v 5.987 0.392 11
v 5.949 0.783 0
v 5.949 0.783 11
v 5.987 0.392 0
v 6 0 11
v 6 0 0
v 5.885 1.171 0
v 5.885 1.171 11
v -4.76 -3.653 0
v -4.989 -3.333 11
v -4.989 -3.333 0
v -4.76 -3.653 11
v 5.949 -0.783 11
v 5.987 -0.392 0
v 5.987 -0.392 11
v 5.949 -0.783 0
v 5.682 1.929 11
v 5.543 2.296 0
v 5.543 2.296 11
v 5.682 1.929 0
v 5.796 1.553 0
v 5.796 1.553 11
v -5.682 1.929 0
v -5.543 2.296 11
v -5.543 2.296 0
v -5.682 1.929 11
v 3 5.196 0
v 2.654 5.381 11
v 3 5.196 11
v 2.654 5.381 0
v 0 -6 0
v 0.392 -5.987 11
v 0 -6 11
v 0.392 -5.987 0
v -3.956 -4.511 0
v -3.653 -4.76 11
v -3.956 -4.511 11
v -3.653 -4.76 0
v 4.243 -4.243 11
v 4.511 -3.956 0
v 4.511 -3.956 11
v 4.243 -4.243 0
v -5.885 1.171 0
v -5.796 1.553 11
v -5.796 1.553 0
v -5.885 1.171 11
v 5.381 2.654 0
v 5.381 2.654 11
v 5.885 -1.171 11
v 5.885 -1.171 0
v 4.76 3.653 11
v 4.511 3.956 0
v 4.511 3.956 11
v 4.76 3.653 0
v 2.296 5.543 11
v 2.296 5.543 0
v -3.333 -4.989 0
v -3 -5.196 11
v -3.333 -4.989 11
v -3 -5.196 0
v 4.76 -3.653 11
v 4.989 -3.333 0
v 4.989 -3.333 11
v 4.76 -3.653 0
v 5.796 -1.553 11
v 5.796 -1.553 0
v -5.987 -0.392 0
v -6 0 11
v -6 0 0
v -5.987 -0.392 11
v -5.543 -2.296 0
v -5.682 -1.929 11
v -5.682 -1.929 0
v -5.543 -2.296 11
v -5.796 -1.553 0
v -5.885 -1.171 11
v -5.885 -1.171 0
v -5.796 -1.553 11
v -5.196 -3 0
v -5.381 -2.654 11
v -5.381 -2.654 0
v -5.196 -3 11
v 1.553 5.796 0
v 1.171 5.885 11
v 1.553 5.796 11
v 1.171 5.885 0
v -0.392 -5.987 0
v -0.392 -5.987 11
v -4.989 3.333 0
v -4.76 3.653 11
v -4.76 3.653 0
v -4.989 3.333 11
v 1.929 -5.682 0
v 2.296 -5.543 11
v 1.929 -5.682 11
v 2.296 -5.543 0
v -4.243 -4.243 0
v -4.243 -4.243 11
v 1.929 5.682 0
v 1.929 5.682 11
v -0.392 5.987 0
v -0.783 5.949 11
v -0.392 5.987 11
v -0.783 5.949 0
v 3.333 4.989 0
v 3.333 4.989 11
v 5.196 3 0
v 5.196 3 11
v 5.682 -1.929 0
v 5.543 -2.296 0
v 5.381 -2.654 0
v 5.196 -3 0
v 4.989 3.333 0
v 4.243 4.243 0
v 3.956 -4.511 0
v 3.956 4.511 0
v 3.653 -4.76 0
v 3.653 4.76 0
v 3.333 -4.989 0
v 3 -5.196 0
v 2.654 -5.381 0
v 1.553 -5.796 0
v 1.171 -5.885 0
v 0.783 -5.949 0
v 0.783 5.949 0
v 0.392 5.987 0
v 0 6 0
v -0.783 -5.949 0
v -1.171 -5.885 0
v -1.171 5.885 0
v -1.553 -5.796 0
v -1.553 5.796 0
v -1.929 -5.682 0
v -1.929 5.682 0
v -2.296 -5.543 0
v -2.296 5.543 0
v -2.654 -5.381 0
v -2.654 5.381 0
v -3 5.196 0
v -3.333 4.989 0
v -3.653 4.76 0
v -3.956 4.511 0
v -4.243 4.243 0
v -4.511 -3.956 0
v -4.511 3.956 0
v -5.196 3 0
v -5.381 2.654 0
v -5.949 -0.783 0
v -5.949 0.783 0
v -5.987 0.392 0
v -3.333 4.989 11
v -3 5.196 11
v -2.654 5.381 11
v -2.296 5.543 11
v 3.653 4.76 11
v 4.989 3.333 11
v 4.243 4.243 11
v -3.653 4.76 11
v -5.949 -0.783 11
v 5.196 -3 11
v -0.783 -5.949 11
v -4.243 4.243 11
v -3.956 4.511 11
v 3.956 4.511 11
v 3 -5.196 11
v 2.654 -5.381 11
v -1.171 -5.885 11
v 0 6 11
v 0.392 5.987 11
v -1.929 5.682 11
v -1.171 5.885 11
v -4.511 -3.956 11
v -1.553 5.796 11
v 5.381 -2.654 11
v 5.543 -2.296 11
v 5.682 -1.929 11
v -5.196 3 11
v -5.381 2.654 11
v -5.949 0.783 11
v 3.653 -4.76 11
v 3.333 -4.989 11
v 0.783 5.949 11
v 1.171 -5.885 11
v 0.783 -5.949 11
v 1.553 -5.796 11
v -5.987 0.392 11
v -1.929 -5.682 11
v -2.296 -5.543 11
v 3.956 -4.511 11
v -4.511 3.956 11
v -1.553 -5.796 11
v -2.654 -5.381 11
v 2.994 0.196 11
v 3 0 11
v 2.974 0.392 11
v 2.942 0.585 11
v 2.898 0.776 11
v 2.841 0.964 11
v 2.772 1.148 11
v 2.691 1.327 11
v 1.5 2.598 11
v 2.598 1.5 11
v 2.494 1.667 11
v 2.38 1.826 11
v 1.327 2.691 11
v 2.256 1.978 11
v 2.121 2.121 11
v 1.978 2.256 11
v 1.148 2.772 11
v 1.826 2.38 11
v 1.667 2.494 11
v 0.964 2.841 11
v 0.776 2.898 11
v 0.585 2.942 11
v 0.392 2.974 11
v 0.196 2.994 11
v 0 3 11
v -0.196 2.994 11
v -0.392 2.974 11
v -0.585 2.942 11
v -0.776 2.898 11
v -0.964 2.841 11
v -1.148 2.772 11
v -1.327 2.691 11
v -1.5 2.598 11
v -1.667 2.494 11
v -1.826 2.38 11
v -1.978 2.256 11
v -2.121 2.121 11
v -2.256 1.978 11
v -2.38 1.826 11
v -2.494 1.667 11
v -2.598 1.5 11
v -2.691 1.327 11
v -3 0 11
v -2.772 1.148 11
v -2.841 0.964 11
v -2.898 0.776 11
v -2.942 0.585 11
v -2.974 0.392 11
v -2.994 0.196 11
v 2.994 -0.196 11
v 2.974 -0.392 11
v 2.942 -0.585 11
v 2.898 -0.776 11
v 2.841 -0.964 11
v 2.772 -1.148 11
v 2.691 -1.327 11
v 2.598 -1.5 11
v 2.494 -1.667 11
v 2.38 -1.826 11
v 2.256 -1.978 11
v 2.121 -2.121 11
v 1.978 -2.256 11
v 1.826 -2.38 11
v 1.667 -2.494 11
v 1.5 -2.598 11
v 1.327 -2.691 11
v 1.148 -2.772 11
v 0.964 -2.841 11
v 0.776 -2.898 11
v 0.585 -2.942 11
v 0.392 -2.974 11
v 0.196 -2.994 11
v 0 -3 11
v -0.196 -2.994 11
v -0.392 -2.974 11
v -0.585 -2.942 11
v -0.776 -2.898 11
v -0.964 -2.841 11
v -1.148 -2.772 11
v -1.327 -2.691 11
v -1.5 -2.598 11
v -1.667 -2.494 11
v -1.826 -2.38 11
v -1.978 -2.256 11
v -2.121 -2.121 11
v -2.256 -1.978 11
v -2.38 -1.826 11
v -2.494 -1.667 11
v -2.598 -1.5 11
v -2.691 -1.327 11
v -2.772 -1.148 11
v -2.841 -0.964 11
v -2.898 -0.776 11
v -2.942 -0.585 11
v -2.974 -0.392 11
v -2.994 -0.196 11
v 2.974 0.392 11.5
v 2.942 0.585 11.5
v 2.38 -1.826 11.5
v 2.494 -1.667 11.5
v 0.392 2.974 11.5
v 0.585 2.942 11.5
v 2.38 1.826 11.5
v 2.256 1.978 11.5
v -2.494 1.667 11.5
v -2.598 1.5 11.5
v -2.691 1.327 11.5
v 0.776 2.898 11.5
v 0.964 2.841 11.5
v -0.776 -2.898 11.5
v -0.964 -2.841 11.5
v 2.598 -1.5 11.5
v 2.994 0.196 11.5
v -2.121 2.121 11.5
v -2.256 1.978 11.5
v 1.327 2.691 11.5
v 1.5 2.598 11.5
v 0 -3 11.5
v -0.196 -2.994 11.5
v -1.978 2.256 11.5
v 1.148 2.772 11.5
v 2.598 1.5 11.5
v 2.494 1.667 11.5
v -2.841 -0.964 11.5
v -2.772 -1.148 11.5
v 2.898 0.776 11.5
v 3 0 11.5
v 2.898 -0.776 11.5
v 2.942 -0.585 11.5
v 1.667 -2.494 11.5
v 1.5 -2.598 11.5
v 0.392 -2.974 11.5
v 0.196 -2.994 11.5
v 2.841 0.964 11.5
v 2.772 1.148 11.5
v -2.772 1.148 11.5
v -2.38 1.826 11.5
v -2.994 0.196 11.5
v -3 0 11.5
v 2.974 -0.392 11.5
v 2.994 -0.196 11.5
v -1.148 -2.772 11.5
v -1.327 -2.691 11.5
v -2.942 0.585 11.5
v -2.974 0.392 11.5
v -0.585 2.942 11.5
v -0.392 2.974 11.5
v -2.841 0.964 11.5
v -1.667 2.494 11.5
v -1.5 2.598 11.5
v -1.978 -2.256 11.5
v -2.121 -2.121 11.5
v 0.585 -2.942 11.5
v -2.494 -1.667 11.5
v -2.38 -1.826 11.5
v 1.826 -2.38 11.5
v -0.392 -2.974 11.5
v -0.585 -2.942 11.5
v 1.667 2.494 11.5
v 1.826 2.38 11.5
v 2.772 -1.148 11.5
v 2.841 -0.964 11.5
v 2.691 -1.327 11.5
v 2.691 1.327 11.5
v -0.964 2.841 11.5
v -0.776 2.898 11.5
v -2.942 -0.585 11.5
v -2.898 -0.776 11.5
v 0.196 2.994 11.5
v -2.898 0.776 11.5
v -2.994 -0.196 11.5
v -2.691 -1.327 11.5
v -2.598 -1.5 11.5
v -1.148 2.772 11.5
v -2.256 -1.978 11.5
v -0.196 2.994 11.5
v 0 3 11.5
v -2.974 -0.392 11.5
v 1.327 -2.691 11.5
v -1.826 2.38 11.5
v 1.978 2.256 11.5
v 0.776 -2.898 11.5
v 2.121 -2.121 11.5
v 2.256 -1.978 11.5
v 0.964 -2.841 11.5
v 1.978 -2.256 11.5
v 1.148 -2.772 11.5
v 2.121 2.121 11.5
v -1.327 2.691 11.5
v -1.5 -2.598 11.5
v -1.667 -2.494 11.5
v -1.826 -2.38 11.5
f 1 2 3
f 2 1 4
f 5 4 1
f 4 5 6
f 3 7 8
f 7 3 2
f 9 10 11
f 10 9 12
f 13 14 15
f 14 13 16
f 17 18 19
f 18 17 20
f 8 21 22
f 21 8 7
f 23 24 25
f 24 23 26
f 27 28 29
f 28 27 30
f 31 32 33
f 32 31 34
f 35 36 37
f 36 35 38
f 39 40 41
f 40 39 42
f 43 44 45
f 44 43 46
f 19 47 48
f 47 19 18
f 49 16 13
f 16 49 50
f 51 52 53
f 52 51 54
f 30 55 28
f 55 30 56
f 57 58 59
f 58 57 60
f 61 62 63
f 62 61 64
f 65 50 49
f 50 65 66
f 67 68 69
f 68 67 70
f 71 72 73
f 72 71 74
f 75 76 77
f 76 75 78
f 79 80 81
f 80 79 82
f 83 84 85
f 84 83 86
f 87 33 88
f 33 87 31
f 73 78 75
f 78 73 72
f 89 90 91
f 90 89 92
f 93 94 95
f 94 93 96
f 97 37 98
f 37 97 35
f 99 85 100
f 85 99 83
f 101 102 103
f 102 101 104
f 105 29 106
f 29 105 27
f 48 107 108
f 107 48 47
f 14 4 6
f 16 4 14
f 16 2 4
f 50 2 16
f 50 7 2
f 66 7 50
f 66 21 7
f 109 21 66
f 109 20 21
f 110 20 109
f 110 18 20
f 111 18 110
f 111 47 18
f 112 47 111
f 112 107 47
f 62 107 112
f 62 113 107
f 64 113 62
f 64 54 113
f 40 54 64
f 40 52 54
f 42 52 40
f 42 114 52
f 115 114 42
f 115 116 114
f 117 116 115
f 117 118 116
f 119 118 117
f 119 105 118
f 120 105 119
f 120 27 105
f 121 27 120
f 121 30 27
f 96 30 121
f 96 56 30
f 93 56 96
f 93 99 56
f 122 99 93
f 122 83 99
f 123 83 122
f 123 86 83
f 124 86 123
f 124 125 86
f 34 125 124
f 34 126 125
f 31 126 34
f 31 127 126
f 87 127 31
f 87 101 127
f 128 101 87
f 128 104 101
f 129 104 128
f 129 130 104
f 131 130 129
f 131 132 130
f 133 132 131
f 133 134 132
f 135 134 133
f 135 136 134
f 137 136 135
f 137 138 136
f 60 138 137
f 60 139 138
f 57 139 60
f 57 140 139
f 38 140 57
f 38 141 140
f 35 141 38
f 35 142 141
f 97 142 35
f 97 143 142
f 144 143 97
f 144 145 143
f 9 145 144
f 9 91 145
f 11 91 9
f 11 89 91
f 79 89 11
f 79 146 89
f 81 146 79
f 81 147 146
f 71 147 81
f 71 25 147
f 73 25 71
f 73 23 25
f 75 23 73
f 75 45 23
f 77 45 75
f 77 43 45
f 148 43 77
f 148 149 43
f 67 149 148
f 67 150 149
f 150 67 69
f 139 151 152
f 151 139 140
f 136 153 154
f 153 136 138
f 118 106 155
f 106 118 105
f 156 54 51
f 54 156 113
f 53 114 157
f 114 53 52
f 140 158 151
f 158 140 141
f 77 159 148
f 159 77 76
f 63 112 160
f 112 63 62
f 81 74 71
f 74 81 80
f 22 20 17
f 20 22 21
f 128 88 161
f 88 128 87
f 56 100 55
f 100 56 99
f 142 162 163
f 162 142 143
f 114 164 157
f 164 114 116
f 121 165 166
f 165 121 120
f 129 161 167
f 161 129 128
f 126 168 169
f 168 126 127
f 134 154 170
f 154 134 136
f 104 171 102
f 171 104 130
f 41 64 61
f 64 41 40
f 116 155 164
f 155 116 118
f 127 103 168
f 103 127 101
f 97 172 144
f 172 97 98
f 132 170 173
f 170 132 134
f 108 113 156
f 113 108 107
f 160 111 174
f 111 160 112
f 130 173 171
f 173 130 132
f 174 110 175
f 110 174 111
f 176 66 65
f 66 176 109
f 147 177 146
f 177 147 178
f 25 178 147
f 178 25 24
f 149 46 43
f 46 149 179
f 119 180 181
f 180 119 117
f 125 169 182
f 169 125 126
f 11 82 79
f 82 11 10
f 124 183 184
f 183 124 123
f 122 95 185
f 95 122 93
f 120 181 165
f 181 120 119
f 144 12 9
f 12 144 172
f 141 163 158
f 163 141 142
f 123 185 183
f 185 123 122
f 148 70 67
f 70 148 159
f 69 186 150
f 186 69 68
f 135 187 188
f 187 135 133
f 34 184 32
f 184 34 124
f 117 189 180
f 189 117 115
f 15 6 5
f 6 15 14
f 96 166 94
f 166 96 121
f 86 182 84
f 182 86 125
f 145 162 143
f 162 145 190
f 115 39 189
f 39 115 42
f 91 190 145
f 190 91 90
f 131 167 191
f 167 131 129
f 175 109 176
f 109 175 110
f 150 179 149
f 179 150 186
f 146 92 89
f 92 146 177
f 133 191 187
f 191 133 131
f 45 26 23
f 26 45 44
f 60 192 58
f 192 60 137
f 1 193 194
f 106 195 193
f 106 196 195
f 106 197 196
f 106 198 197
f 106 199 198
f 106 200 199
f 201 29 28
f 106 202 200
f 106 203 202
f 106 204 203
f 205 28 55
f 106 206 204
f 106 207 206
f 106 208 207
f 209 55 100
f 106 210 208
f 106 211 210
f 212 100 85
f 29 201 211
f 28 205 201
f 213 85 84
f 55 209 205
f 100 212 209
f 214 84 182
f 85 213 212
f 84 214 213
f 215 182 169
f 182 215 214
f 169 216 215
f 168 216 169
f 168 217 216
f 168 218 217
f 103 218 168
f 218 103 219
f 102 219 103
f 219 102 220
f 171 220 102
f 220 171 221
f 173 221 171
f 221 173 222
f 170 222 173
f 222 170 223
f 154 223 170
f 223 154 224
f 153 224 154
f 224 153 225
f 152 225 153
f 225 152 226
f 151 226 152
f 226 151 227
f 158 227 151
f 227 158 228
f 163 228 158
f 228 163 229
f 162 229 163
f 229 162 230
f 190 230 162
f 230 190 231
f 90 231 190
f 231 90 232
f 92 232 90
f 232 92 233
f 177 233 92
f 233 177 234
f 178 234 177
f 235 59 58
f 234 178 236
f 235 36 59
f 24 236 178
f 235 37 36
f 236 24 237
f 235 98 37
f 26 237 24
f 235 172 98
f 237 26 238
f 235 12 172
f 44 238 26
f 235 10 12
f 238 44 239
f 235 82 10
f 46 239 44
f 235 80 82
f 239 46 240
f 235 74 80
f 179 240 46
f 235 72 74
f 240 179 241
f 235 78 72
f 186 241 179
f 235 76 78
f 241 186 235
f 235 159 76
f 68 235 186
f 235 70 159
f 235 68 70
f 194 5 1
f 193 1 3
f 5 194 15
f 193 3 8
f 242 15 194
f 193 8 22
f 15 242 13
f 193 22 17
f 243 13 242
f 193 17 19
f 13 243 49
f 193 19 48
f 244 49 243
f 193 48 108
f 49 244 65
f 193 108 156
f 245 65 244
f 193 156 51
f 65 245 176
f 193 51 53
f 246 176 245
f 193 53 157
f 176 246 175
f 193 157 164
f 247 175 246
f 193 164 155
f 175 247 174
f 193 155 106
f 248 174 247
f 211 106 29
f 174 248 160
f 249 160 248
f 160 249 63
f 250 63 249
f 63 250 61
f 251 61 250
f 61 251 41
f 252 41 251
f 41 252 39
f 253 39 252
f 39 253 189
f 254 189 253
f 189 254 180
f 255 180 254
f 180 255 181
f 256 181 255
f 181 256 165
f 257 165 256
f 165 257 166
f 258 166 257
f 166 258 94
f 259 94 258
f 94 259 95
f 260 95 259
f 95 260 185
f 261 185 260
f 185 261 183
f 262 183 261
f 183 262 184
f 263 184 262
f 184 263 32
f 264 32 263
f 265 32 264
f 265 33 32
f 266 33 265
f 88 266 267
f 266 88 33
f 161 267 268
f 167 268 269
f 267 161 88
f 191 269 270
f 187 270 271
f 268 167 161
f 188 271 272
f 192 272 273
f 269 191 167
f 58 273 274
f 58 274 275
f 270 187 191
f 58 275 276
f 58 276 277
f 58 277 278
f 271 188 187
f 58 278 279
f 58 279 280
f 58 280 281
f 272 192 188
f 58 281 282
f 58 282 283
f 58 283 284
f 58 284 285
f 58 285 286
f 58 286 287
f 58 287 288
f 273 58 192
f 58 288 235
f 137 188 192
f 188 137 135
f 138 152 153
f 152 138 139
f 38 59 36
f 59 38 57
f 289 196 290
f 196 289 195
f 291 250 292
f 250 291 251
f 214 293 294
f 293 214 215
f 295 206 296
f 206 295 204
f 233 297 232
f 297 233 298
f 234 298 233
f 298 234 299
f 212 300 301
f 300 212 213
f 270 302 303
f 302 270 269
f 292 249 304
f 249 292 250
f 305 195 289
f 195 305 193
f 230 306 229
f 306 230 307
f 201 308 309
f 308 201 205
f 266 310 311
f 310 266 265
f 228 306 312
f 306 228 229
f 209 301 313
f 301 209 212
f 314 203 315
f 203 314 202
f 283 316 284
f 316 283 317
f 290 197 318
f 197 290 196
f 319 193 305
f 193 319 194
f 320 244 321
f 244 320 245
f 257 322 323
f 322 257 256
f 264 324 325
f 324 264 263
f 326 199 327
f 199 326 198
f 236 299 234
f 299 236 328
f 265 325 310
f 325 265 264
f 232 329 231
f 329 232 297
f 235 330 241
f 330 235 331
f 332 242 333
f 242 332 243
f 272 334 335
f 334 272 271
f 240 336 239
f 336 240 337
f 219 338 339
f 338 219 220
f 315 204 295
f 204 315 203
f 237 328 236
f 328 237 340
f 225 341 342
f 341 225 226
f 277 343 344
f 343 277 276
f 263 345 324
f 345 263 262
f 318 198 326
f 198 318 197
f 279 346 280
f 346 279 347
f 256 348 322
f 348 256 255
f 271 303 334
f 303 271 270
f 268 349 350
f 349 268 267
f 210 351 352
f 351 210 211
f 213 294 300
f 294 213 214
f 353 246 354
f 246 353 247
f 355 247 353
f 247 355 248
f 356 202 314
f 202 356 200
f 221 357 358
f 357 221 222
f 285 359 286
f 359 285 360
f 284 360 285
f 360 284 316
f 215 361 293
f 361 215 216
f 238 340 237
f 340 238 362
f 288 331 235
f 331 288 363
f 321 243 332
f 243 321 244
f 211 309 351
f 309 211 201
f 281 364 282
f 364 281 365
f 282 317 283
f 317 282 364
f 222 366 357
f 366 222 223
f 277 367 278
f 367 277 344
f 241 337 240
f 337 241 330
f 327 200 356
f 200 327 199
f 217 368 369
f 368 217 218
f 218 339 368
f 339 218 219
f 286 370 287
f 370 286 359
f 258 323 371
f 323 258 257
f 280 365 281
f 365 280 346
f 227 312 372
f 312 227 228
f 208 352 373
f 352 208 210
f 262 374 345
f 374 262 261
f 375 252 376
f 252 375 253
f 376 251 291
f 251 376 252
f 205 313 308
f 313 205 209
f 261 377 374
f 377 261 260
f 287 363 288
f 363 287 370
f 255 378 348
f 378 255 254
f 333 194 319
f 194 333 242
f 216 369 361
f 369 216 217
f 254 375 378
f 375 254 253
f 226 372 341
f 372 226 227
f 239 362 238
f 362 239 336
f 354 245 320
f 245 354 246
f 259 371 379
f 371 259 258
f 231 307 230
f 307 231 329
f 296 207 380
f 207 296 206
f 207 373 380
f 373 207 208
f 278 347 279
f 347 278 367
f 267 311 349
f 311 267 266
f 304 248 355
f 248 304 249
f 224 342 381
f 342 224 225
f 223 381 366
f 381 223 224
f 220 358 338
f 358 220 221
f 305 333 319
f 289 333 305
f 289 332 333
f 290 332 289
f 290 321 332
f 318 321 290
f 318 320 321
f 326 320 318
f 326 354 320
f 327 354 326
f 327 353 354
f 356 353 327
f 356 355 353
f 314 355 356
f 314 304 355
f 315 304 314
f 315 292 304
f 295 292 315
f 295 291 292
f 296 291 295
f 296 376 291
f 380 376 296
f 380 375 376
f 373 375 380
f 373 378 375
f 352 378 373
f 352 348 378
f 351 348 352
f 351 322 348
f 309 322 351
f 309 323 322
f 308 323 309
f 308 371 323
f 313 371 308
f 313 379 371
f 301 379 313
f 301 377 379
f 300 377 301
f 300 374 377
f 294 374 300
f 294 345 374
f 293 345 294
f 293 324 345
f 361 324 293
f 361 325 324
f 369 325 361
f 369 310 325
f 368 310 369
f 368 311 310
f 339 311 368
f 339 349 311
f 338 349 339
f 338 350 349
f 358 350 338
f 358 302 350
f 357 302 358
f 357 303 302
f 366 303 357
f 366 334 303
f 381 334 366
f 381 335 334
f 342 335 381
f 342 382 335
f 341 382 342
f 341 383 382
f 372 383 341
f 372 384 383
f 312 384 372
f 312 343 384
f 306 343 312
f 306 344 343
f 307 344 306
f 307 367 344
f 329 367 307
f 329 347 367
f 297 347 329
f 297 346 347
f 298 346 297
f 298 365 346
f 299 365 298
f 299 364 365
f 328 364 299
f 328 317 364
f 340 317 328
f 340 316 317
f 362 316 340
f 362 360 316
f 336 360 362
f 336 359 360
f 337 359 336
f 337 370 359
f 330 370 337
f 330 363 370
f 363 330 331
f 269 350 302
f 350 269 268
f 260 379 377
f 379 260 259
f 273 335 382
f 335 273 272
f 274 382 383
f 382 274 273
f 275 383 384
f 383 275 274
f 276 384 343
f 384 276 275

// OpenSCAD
$fn = 96;

// Potentiometer parameters: [body_d, body_h, shaft_d, shaft_h]
p = [12, 11, 6, 0.5];

body_d  = p[0];
body_h  = p[1];
shaft_d = p[2];
shaft_h = p[3];

module potentiometer(body_d=12, body_h=11, shaft_d=6, shaft_h=0.5) {
    union() {
        // Main body
        cylinder(d=body_d, h=body_h);

        // Shaft (centered on top)
        translate([0,0,body_h])
            cylinder(d=shaft_d, h=shaft_h);

        // Small flat/tab to suggest orientation (subtle)
        translate([body_d*0.35, 0, body_h*0.25])
            cube([body_d*0.12, body_d*0.35, body_h*0.5], center=true);
    }
}

potentiometer(body_d, body_h, shaft_d, shaft_h);
